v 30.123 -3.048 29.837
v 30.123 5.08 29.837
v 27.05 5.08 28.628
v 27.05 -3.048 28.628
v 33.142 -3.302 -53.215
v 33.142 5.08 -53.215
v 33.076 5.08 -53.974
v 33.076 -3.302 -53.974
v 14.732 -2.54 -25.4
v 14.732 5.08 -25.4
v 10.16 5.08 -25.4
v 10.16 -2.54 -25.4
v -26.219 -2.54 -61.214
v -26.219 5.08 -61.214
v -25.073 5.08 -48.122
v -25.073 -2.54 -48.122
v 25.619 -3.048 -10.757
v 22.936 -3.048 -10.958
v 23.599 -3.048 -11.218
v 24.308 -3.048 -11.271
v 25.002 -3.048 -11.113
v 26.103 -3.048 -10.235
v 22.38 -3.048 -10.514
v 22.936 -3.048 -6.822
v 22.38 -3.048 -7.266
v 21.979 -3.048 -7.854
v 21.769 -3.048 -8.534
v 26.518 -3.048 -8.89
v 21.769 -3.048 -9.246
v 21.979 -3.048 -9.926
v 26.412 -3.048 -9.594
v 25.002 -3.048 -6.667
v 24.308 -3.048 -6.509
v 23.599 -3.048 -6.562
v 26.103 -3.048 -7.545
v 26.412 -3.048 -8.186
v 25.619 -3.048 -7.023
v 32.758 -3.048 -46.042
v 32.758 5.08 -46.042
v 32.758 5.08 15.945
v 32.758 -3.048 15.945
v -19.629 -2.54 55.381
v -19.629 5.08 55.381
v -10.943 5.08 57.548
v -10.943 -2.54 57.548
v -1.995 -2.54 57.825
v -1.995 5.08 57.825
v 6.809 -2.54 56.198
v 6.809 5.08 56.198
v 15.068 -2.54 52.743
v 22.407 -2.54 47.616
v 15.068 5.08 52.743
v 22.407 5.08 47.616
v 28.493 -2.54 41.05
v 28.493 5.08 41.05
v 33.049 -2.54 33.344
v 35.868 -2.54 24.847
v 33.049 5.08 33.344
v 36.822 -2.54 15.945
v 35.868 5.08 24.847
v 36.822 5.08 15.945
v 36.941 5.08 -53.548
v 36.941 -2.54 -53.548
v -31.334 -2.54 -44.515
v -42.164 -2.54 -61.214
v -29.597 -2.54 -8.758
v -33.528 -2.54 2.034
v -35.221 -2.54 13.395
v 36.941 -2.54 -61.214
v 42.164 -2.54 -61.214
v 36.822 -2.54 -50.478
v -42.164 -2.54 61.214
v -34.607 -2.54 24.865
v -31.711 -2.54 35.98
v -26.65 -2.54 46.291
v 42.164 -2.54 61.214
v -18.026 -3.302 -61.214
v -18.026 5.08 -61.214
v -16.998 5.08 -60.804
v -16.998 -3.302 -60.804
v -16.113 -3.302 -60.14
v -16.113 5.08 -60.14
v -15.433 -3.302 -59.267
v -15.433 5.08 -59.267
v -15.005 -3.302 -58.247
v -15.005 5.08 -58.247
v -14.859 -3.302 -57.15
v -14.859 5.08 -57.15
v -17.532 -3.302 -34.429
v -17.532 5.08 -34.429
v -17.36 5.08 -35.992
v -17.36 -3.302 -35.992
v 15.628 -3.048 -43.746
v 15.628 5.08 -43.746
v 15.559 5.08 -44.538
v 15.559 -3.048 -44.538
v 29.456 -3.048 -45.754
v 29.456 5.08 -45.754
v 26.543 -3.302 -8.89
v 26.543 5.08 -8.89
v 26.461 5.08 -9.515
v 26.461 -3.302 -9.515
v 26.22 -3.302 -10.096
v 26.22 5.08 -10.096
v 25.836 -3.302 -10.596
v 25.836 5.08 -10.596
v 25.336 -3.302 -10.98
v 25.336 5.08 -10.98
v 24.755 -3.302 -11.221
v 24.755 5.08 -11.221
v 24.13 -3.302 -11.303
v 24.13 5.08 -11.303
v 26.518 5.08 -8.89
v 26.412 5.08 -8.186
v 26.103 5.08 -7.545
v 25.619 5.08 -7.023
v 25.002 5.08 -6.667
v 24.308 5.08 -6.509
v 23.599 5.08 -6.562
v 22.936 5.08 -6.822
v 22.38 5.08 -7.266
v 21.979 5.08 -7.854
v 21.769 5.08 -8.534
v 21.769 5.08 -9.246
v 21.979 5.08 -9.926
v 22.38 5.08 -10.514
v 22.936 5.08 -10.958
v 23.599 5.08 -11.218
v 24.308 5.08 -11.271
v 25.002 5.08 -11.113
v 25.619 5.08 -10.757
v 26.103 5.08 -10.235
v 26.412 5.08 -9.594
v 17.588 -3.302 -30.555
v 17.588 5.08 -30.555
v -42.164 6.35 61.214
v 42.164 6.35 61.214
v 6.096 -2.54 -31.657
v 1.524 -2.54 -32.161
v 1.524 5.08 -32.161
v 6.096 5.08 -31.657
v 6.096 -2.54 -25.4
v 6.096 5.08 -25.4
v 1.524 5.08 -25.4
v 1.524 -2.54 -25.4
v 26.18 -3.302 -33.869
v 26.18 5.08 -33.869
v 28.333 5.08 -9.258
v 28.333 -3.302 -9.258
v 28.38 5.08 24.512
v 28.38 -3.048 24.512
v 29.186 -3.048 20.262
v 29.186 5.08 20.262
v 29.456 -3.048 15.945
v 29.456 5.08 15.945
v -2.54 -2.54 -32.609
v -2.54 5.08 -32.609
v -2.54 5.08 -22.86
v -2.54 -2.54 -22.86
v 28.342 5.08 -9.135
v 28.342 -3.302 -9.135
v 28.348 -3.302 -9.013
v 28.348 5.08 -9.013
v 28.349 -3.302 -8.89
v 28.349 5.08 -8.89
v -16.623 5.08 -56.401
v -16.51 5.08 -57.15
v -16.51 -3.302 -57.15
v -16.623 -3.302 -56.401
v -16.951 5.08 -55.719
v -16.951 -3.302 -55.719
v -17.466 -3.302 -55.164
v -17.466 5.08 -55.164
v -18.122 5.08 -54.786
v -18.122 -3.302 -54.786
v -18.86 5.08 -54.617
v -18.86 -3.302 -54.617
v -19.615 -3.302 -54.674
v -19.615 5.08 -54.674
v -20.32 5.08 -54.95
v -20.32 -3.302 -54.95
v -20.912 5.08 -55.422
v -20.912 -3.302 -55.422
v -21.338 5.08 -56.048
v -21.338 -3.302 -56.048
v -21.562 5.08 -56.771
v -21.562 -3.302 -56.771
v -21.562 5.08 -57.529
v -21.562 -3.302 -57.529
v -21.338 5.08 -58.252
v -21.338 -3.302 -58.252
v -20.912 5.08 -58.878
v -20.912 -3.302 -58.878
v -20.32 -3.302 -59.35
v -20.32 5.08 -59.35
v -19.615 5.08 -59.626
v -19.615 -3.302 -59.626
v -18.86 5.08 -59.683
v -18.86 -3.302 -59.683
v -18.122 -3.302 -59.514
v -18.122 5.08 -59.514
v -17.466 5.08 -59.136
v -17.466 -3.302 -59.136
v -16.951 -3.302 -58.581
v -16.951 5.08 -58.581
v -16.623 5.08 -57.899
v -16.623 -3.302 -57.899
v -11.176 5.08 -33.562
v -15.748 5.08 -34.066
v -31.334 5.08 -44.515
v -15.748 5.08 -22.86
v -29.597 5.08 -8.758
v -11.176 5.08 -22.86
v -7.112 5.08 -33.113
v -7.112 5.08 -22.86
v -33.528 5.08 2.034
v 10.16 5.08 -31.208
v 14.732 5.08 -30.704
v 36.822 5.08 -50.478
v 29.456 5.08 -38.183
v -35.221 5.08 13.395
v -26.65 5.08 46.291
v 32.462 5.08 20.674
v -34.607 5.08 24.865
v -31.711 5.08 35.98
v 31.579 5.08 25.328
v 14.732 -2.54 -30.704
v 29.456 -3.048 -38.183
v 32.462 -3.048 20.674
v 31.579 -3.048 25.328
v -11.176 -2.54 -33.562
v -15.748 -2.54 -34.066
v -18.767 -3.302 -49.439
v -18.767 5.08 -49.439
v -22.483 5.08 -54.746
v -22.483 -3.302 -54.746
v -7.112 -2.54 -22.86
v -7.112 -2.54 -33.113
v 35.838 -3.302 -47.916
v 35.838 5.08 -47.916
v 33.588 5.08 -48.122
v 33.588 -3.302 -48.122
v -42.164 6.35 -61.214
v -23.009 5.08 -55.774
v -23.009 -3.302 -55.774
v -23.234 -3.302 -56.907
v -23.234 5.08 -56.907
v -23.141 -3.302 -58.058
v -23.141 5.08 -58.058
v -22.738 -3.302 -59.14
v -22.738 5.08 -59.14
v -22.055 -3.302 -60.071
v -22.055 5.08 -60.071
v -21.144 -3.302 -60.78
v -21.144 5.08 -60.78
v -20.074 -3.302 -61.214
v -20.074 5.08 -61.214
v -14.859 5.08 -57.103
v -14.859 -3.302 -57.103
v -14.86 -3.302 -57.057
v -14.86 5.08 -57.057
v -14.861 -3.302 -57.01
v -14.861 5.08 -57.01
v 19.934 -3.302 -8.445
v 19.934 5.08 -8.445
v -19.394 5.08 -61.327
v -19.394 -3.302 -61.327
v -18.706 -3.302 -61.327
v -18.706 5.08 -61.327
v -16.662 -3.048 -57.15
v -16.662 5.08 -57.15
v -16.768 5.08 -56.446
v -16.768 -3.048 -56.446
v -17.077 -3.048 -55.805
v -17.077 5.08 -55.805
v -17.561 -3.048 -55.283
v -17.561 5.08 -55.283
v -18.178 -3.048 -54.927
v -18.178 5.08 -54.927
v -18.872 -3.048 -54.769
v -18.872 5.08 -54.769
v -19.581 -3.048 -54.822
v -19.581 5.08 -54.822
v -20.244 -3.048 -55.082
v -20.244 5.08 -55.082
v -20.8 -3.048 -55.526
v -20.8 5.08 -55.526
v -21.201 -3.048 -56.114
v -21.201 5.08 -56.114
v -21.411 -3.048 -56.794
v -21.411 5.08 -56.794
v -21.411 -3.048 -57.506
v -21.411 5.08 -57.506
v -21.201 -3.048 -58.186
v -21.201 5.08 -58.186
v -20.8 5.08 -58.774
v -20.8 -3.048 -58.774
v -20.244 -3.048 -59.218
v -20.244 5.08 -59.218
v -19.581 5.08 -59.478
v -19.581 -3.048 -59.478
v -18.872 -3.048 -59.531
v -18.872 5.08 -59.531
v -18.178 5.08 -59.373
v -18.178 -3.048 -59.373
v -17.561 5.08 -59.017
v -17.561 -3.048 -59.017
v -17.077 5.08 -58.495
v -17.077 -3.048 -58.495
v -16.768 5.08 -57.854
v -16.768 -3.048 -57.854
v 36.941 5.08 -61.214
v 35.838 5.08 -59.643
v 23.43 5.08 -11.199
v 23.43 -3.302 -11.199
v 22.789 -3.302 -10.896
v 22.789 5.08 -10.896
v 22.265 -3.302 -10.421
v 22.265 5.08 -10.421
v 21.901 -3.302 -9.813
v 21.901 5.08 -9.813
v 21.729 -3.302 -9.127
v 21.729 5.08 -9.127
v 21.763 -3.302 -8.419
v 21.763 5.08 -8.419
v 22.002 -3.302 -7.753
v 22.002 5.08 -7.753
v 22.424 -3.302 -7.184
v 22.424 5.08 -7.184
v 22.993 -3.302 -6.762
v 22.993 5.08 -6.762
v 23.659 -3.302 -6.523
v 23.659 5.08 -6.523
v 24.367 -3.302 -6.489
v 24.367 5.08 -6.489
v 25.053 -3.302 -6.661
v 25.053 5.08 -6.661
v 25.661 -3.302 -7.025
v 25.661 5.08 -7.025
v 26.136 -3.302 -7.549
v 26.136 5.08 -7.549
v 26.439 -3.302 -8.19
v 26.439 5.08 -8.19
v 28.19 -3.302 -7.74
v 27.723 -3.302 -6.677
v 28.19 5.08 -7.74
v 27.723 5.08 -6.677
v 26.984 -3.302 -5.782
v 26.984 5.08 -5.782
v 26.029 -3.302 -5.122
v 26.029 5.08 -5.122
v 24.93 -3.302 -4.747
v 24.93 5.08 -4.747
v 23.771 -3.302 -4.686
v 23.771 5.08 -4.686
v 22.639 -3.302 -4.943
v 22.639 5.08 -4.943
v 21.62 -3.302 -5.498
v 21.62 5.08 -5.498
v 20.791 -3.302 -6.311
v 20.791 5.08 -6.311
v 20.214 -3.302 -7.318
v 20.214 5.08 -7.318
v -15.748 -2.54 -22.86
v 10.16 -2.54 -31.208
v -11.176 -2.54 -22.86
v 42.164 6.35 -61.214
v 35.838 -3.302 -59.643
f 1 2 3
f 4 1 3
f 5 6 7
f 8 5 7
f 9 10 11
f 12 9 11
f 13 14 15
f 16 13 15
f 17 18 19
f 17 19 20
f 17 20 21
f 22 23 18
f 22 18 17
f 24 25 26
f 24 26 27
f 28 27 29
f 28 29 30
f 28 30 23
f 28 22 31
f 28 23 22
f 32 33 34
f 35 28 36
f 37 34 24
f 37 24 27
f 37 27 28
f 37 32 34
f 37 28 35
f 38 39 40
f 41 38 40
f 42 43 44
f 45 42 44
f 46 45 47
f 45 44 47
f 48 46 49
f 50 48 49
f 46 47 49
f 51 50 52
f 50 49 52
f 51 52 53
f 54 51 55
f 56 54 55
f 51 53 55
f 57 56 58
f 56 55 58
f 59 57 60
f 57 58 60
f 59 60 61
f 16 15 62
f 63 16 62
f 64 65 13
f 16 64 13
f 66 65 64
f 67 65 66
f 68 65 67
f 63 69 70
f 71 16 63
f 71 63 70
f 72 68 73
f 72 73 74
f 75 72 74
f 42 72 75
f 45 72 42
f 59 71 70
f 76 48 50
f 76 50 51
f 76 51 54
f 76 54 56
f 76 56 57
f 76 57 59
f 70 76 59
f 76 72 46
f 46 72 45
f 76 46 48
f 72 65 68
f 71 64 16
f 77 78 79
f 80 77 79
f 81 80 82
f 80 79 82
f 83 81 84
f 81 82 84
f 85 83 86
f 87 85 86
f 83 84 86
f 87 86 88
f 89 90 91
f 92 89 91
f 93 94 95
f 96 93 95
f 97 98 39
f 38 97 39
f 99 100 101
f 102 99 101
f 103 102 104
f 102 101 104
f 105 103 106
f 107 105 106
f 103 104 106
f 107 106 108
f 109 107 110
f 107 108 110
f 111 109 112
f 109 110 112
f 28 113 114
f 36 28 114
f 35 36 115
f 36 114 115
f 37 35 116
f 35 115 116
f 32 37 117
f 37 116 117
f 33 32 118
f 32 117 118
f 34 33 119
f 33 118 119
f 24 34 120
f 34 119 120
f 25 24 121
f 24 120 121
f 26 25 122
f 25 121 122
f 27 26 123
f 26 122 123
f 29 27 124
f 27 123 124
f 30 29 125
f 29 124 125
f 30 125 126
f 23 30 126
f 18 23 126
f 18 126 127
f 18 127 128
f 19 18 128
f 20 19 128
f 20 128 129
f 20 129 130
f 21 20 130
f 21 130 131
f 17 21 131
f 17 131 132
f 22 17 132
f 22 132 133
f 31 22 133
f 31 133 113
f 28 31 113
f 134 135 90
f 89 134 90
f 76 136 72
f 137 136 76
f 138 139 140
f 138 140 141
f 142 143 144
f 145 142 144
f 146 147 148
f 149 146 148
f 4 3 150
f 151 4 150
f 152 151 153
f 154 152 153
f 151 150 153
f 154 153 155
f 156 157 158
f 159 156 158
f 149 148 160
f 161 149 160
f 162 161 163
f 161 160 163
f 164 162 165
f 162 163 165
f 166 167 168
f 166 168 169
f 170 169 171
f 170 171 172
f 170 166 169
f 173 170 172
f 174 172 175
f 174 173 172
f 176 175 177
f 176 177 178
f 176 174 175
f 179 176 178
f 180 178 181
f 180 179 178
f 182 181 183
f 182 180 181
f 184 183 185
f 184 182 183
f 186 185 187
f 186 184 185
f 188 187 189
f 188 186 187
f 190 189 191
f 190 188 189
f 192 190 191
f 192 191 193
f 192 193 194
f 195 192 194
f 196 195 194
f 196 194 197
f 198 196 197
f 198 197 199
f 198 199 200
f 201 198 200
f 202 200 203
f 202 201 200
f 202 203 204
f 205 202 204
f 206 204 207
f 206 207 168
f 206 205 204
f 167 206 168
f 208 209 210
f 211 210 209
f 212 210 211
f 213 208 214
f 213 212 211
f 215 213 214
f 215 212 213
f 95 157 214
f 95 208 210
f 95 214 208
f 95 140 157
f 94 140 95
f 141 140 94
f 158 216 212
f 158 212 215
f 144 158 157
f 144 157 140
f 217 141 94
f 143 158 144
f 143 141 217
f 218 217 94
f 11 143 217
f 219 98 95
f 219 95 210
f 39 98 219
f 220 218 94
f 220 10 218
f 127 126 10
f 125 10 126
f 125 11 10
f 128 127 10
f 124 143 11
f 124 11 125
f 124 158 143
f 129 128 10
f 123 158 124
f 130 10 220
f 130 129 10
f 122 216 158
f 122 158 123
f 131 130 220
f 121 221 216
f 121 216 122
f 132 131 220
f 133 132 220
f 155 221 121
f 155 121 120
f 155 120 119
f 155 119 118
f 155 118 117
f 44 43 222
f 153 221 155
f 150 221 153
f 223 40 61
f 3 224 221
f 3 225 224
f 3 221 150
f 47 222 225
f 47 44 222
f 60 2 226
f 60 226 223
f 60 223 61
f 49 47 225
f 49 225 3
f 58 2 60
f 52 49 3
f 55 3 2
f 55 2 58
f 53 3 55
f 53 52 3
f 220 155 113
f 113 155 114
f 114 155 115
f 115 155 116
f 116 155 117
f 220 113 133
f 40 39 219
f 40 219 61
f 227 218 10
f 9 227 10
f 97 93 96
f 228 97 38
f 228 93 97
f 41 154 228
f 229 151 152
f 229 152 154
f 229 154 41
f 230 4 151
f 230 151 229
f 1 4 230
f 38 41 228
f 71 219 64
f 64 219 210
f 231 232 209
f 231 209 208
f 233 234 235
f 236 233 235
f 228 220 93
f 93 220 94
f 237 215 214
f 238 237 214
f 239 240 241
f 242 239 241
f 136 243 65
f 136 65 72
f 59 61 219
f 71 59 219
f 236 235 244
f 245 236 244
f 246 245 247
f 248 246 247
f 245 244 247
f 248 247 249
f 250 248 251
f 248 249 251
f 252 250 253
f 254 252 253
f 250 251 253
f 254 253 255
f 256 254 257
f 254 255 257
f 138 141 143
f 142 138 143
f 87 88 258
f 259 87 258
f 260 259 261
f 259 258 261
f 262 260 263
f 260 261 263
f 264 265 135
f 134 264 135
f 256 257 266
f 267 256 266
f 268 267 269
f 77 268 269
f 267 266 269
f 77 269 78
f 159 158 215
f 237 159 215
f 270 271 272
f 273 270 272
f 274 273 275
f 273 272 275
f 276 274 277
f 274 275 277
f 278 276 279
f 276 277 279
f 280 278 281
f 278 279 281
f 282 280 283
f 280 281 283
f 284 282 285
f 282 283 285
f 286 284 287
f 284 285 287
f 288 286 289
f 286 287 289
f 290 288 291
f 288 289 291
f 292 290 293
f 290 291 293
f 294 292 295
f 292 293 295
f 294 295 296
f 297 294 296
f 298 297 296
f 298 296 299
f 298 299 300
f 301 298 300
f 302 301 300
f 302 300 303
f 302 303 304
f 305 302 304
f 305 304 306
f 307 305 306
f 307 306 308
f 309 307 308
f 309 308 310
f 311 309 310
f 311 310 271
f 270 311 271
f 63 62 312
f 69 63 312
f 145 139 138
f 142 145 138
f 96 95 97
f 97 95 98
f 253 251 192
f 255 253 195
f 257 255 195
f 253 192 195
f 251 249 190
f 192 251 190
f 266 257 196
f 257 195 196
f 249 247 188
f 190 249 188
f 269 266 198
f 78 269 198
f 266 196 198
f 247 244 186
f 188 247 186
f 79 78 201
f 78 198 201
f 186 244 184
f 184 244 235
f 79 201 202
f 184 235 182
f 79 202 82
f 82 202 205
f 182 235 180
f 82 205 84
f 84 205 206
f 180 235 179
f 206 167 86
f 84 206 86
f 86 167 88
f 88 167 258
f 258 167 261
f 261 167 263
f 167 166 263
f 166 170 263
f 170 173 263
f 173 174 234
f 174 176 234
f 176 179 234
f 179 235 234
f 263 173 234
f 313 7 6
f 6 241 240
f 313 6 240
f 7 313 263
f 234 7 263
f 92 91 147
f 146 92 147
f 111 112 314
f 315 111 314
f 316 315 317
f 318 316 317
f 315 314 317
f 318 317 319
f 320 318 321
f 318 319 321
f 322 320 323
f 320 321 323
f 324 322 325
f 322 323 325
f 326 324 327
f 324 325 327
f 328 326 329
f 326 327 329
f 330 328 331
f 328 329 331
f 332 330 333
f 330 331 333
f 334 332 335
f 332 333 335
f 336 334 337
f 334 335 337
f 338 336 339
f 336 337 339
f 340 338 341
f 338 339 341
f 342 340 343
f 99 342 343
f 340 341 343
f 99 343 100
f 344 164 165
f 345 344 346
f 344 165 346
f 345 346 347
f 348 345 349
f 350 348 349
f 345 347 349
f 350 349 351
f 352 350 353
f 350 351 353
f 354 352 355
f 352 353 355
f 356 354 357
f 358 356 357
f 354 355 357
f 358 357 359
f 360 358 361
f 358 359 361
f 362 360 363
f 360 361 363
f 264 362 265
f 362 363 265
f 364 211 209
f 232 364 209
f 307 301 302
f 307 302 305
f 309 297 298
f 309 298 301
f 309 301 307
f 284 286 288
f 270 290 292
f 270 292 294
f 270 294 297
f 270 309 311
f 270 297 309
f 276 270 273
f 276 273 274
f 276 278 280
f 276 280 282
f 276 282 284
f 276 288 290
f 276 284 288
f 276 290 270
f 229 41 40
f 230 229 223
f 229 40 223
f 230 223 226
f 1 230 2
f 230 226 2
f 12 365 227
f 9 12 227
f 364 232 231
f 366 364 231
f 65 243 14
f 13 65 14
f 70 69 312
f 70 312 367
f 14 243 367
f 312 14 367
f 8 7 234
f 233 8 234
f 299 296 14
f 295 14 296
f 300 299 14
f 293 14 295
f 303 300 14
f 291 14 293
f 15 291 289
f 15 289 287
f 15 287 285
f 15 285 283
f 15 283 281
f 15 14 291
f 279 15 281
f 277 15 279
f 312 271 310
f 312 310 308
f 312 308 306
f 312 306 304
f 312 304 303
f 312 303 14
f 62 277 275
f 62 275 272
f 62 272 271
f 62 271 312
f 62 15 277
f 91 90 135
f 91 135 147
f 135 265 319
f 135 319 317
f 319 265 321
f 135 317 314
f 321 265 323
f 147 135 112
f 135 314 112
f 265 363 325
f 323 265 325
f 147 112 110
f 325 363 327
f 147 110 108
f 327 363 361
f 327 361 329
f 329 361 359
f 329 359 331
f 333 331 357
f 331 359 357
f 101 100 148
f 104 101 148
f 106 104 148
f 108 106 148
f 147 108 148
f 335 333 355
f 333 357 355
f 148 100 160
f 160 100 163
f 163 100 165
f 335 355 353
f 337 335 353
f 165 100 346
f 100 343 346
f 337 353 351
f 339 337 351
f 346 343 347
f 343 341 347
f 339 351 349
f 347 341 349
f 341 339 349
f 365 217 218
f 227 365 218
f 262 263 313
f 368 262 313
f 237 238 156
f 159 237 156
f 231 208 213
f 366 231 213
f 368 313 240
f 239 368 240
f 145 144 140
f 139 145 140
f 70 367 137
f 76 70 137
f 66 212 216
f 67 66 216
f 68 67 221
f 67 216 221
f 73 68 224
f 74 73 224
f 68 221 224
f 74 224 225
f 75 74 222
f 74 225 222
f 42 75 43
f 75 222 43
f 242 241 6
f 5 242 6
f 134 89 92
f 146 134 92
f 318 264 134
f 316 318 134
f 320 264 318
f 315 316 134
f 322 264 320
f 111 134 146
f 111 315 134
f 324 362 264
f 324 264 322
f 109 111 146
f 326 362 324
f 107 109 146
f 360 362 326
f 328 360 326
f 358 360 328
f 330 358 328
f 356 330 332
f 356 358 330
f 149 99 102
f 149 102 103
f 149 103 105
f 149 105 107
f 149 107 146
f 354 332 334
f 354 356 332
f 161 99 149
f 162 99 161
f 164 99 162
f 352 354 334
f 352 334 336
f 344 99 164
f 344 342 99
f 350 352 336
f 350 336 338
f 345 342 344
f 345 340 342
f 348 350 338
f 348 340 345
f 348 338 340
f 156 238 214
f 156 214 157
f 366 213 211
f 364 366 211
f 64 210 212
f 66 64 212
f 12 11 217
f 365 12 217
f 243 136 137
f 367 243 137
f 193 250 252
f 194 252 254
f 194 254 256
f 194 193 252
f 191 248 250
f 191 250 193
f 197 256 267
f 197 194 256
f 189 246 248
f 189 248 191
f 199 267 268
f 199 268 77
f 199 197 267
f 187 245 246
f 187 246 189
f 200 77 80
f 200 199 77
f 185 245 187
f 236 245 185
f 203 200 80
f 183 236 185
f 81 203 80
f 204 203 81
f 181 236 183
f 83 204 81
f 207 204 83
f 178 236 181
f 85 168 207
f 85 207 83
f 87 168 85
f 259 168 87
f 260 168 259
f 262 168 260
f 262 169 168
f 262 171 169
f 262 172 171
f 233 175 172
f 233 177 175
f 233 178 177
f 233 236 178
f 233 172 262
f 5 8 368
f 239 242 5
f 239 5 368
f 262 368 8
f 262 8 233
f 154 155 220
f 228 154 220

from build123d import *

# Parameters (mm, degrees)
F2_W      = 84.328
F2_H      = 122.428
F3_DEPTH  = 1.27
F5_DEPTH  = 8.89
F6_R      = 2.3876
F7_DEPTH  = 9.398
F9_DEPTH  = 8.89
F11_DEPTH = 8.382
F12_R     = 2.54
F13_DEPTH = 8.382


with BuildPart() as f3:
    # F2 (on offset) → F3 (new body)
    with BuildSketch(Plane.XZ.offset(-6.35)):
        Rectangle(F2_W, F2_H)
    extrude(amount=F3_DEPTH)

    # F4 (on offset) → F5 (join)
    with BuildSketch(Plane.XZ.offset(-6.35)):
        Polygon((42.164, -61.214), (42.164, 61.214), (-42.164, 61.214), (-42.164, -61.214), (-26.2186949899, -61.214), (-25.073299104, -48.1220651165), (36.9407255852, -53.5475892565), (36.9407255852, -61.214), align=None)
        with BuildLine():
            ThreePointArc((-19.6291451355, 55.3810316706), (18.8744427286, 50.3759680711), (36.8217671163, 15.9453060478))
            Line((36.8217671163, 15.9453060478), (36.8217671163, -50.4775388742))
            Line((36.8217671163, -50.4775388742), (-31.3344904241, -44.514638991))
            Line((-31.3344904241, -44.514638991), (-29.5968536021, -8.758113657))
            ThreePointArc((-29.5968536021, -8.758113657), (-34.6070188833, 24.864605255), (-19.6291451355, 55.3810316706))
        make_face(mode=Mode.SUBTRACT)
    extrude(amount=F5_DEPTH)

    # F6 (on offset) → F7 (join)
    with BuildSketch(Plane.XZ.offset(-6.35)):
        Polygon((15.5587220069, -44.5377389431), (29.4557679445, -45.7535729192), (29.4557679445, -38.1827019155), (15.6280227207, -43.745628159), align=None)
        with BuildLine():
            Line((32.7577671163, -46.0424604137), (32.7577671163, 15.9453060478))
            ThreePointArc((32.7577671163, 15.9453060478), (32.0932237014, 23.014866335), (30.1228756901, 29.8367450586))
            Line((30.1228756901, 29.8367450586), (27.0502206373, 28.6276174982))
            ThreePointArc((27.0502206373, 28.6276174982), (28.8490671877, 22.3995233042), (29.4557679445, 15.9453060478))
            Line((29.4557679445, 15.9453060478), (29.4557679445, -38.1827019155))
            Line((29.4557679445, -38.1827019155), (29.4557679445, -45.7535729192))
            Line((29.4557679445, -45.7535729192), (32.7577671163, -46.0424604137))
        make_face()
        with Locations((24.13, -8.89)):
            Circle(F6_R)
        with Locations((-19.05, -57.15)):
            Circle(F6_R)
    extrude(amount=F7_DEPTH)

    # F8 (on offset) → F9 (join)
    with BuildSketch(Plane.XZ.offset(-6.35)):
        Polygon((-15.748, -33.02), (-15.748, -34.0658823529), (-11.176, -33.5616176471), (-11.176, -22.86), (-15.748, -22.86), align=None)
        Polygon((-2.54, -22.86), (-7.112, -22.86), (-7.112, -33.1133823529), (-2.54, -32.6091176471), align=None)
        Polygon((6.096, -25.4), (1.524, -25.4), (1.524, -32.1608823529), (6.096, -31.6566176471), align=None)
        Polygon((10.16, -31.2083823529), (14.732000418, -30.704117601), (14.732000418, -25.4), (10.16, -25.4), align=None)
    extrude(amount=F9_DEPTH)


with BuildPart() as f11:
    # F10 (on face) → F11 (new body)
    with BuildSketch(Plane.XZ.offset(-5.08)):
        with BuildLine():
            ThreePointArc((28.3334333918, -9.2577527697), (26.9806460066, -12.0009342205), (24.13, -13.1094898245))
            ThreePointArc((24.13, -13.1094898245), (20.992915154, -11.7118421373), (19.9340623038, -8.444802035))
            Line((19.9340623038, -8.444802035), (17.5881162286, -30.5550638586))
            Line((17.5881162286, -30.5550638586), (-17.5324635623, -34.4286572179))
            Line((-17.5324635623, -34.4286572179), (-17.3600902965, -35.9915081612))
            Line((-17.3600902965, -35.9915081612), (26.1802510808, -33.8687392022))
            Line((26.1802510808, -33.8687392022), (28.3334333918, -9.2577527697))
        make_face()
        with BuildLine():
            ThreePointArc((19.9340623038, -8.444802035), (20.992915154, -11.7118421373), (24.13, -13.1094898245))
            ThreePointArc((24.13, -13.1094898245), (26.9806460066, -12.0009342205), (28.3334333918, -9.2577527697))
            ThreePointArc((28.3334333918, -9.2577527697), (28.3454738051, -9.0740515611), (28.3494898245, -8.89))
            ThreePointArc((28.3494898245, -8.89), (24.3529102571, -4.6764023215), (19.9340623038, -8.444802035))
        make_face()
        with BuildLine():
            ThreePointArc((24.13, -11.303), (22.423751337, -7.183751337), (26.543, -8.89))
            ThreePointArc((26.543, -8.89), (25.836248663, -10.596248663), (24.13, -11.303))
        make_face(mode=Mode.SUBTRACT)
    extrude(amount=F11_DEPTH)


with BuildPart() as f13:
    # F12 (on face) → F13 (new body)
    with BuildSketch(Plane.XZ.offset(-5.08)):
        with BuildLine():
            ThreePointArc((-22.4830662176, -54.7461411553), (-17.8564675206, -53.132542941), (-14.861323701, -57.0104583862))
            Line((-14.861323701, -57.0104583862), (35.8383679064, -59.6430109843))
            Line((35.8383679064, -59.6430109843), (35.8383679064, -53.4511454564))
            Line((35.8383679064, -53.4511454564), (33.141926992, -53.2152374445))
            Line((33.141926992, -53.2152374445), (33.0755143161, -53.9743378045))
            Line((33.0755143161, -53.9743378045), (-18.7667736394, -49.4387253171))
            Line((-18.7667736394, -49.4387253171), (-22.4830662176, -54.7461411553))
        make_face()
        Polygon((33.141926992, -53.2152374445), (35.8383679064, -53.4511454564), (35.8383679064, -47.9159813442), (33.5875218321, -48.1220651165), align=None)
        with BuildLine():
            ThreePointArc((-18.026093266, -61.214), (-15.744272083, -59.7261684609), (-14.859, -57.15))
            ThreePointArc((-14.859, -57.15), (-14.8595809655, -57.08021952), (-14.861323701, -57.0104583862))
            ThreePointArc((-14.861323701, -57.0104583862), (-17.8564675206, -53.132542941), (-22.4830662176, -54.7461411553))
            ThreePointArc((-22.4830662176, -54.7461411553), (-22.9773975457, -58.6128839729), (-20.073906734, -61.214))
            Line((-20.073906734, -61.214), (-18.026093266, -61.214))
        make_face()
        with Locations((-19.05, -57.15)):
            Circle(F12_R, mode=Mode.SUBTRACT)
        with BuildLine():
            ThreePointArc((-20.073906734, -61.214), (-19.05, -61.341), (-18.026093266, -61.214))
            Line((-18.026093266, -61.214), (-20.073906734, -61.214))
        make_face()
    extrude(amount=F13_DEPTH)


solid = Compound([f3.part, f11.part, f13.part])
